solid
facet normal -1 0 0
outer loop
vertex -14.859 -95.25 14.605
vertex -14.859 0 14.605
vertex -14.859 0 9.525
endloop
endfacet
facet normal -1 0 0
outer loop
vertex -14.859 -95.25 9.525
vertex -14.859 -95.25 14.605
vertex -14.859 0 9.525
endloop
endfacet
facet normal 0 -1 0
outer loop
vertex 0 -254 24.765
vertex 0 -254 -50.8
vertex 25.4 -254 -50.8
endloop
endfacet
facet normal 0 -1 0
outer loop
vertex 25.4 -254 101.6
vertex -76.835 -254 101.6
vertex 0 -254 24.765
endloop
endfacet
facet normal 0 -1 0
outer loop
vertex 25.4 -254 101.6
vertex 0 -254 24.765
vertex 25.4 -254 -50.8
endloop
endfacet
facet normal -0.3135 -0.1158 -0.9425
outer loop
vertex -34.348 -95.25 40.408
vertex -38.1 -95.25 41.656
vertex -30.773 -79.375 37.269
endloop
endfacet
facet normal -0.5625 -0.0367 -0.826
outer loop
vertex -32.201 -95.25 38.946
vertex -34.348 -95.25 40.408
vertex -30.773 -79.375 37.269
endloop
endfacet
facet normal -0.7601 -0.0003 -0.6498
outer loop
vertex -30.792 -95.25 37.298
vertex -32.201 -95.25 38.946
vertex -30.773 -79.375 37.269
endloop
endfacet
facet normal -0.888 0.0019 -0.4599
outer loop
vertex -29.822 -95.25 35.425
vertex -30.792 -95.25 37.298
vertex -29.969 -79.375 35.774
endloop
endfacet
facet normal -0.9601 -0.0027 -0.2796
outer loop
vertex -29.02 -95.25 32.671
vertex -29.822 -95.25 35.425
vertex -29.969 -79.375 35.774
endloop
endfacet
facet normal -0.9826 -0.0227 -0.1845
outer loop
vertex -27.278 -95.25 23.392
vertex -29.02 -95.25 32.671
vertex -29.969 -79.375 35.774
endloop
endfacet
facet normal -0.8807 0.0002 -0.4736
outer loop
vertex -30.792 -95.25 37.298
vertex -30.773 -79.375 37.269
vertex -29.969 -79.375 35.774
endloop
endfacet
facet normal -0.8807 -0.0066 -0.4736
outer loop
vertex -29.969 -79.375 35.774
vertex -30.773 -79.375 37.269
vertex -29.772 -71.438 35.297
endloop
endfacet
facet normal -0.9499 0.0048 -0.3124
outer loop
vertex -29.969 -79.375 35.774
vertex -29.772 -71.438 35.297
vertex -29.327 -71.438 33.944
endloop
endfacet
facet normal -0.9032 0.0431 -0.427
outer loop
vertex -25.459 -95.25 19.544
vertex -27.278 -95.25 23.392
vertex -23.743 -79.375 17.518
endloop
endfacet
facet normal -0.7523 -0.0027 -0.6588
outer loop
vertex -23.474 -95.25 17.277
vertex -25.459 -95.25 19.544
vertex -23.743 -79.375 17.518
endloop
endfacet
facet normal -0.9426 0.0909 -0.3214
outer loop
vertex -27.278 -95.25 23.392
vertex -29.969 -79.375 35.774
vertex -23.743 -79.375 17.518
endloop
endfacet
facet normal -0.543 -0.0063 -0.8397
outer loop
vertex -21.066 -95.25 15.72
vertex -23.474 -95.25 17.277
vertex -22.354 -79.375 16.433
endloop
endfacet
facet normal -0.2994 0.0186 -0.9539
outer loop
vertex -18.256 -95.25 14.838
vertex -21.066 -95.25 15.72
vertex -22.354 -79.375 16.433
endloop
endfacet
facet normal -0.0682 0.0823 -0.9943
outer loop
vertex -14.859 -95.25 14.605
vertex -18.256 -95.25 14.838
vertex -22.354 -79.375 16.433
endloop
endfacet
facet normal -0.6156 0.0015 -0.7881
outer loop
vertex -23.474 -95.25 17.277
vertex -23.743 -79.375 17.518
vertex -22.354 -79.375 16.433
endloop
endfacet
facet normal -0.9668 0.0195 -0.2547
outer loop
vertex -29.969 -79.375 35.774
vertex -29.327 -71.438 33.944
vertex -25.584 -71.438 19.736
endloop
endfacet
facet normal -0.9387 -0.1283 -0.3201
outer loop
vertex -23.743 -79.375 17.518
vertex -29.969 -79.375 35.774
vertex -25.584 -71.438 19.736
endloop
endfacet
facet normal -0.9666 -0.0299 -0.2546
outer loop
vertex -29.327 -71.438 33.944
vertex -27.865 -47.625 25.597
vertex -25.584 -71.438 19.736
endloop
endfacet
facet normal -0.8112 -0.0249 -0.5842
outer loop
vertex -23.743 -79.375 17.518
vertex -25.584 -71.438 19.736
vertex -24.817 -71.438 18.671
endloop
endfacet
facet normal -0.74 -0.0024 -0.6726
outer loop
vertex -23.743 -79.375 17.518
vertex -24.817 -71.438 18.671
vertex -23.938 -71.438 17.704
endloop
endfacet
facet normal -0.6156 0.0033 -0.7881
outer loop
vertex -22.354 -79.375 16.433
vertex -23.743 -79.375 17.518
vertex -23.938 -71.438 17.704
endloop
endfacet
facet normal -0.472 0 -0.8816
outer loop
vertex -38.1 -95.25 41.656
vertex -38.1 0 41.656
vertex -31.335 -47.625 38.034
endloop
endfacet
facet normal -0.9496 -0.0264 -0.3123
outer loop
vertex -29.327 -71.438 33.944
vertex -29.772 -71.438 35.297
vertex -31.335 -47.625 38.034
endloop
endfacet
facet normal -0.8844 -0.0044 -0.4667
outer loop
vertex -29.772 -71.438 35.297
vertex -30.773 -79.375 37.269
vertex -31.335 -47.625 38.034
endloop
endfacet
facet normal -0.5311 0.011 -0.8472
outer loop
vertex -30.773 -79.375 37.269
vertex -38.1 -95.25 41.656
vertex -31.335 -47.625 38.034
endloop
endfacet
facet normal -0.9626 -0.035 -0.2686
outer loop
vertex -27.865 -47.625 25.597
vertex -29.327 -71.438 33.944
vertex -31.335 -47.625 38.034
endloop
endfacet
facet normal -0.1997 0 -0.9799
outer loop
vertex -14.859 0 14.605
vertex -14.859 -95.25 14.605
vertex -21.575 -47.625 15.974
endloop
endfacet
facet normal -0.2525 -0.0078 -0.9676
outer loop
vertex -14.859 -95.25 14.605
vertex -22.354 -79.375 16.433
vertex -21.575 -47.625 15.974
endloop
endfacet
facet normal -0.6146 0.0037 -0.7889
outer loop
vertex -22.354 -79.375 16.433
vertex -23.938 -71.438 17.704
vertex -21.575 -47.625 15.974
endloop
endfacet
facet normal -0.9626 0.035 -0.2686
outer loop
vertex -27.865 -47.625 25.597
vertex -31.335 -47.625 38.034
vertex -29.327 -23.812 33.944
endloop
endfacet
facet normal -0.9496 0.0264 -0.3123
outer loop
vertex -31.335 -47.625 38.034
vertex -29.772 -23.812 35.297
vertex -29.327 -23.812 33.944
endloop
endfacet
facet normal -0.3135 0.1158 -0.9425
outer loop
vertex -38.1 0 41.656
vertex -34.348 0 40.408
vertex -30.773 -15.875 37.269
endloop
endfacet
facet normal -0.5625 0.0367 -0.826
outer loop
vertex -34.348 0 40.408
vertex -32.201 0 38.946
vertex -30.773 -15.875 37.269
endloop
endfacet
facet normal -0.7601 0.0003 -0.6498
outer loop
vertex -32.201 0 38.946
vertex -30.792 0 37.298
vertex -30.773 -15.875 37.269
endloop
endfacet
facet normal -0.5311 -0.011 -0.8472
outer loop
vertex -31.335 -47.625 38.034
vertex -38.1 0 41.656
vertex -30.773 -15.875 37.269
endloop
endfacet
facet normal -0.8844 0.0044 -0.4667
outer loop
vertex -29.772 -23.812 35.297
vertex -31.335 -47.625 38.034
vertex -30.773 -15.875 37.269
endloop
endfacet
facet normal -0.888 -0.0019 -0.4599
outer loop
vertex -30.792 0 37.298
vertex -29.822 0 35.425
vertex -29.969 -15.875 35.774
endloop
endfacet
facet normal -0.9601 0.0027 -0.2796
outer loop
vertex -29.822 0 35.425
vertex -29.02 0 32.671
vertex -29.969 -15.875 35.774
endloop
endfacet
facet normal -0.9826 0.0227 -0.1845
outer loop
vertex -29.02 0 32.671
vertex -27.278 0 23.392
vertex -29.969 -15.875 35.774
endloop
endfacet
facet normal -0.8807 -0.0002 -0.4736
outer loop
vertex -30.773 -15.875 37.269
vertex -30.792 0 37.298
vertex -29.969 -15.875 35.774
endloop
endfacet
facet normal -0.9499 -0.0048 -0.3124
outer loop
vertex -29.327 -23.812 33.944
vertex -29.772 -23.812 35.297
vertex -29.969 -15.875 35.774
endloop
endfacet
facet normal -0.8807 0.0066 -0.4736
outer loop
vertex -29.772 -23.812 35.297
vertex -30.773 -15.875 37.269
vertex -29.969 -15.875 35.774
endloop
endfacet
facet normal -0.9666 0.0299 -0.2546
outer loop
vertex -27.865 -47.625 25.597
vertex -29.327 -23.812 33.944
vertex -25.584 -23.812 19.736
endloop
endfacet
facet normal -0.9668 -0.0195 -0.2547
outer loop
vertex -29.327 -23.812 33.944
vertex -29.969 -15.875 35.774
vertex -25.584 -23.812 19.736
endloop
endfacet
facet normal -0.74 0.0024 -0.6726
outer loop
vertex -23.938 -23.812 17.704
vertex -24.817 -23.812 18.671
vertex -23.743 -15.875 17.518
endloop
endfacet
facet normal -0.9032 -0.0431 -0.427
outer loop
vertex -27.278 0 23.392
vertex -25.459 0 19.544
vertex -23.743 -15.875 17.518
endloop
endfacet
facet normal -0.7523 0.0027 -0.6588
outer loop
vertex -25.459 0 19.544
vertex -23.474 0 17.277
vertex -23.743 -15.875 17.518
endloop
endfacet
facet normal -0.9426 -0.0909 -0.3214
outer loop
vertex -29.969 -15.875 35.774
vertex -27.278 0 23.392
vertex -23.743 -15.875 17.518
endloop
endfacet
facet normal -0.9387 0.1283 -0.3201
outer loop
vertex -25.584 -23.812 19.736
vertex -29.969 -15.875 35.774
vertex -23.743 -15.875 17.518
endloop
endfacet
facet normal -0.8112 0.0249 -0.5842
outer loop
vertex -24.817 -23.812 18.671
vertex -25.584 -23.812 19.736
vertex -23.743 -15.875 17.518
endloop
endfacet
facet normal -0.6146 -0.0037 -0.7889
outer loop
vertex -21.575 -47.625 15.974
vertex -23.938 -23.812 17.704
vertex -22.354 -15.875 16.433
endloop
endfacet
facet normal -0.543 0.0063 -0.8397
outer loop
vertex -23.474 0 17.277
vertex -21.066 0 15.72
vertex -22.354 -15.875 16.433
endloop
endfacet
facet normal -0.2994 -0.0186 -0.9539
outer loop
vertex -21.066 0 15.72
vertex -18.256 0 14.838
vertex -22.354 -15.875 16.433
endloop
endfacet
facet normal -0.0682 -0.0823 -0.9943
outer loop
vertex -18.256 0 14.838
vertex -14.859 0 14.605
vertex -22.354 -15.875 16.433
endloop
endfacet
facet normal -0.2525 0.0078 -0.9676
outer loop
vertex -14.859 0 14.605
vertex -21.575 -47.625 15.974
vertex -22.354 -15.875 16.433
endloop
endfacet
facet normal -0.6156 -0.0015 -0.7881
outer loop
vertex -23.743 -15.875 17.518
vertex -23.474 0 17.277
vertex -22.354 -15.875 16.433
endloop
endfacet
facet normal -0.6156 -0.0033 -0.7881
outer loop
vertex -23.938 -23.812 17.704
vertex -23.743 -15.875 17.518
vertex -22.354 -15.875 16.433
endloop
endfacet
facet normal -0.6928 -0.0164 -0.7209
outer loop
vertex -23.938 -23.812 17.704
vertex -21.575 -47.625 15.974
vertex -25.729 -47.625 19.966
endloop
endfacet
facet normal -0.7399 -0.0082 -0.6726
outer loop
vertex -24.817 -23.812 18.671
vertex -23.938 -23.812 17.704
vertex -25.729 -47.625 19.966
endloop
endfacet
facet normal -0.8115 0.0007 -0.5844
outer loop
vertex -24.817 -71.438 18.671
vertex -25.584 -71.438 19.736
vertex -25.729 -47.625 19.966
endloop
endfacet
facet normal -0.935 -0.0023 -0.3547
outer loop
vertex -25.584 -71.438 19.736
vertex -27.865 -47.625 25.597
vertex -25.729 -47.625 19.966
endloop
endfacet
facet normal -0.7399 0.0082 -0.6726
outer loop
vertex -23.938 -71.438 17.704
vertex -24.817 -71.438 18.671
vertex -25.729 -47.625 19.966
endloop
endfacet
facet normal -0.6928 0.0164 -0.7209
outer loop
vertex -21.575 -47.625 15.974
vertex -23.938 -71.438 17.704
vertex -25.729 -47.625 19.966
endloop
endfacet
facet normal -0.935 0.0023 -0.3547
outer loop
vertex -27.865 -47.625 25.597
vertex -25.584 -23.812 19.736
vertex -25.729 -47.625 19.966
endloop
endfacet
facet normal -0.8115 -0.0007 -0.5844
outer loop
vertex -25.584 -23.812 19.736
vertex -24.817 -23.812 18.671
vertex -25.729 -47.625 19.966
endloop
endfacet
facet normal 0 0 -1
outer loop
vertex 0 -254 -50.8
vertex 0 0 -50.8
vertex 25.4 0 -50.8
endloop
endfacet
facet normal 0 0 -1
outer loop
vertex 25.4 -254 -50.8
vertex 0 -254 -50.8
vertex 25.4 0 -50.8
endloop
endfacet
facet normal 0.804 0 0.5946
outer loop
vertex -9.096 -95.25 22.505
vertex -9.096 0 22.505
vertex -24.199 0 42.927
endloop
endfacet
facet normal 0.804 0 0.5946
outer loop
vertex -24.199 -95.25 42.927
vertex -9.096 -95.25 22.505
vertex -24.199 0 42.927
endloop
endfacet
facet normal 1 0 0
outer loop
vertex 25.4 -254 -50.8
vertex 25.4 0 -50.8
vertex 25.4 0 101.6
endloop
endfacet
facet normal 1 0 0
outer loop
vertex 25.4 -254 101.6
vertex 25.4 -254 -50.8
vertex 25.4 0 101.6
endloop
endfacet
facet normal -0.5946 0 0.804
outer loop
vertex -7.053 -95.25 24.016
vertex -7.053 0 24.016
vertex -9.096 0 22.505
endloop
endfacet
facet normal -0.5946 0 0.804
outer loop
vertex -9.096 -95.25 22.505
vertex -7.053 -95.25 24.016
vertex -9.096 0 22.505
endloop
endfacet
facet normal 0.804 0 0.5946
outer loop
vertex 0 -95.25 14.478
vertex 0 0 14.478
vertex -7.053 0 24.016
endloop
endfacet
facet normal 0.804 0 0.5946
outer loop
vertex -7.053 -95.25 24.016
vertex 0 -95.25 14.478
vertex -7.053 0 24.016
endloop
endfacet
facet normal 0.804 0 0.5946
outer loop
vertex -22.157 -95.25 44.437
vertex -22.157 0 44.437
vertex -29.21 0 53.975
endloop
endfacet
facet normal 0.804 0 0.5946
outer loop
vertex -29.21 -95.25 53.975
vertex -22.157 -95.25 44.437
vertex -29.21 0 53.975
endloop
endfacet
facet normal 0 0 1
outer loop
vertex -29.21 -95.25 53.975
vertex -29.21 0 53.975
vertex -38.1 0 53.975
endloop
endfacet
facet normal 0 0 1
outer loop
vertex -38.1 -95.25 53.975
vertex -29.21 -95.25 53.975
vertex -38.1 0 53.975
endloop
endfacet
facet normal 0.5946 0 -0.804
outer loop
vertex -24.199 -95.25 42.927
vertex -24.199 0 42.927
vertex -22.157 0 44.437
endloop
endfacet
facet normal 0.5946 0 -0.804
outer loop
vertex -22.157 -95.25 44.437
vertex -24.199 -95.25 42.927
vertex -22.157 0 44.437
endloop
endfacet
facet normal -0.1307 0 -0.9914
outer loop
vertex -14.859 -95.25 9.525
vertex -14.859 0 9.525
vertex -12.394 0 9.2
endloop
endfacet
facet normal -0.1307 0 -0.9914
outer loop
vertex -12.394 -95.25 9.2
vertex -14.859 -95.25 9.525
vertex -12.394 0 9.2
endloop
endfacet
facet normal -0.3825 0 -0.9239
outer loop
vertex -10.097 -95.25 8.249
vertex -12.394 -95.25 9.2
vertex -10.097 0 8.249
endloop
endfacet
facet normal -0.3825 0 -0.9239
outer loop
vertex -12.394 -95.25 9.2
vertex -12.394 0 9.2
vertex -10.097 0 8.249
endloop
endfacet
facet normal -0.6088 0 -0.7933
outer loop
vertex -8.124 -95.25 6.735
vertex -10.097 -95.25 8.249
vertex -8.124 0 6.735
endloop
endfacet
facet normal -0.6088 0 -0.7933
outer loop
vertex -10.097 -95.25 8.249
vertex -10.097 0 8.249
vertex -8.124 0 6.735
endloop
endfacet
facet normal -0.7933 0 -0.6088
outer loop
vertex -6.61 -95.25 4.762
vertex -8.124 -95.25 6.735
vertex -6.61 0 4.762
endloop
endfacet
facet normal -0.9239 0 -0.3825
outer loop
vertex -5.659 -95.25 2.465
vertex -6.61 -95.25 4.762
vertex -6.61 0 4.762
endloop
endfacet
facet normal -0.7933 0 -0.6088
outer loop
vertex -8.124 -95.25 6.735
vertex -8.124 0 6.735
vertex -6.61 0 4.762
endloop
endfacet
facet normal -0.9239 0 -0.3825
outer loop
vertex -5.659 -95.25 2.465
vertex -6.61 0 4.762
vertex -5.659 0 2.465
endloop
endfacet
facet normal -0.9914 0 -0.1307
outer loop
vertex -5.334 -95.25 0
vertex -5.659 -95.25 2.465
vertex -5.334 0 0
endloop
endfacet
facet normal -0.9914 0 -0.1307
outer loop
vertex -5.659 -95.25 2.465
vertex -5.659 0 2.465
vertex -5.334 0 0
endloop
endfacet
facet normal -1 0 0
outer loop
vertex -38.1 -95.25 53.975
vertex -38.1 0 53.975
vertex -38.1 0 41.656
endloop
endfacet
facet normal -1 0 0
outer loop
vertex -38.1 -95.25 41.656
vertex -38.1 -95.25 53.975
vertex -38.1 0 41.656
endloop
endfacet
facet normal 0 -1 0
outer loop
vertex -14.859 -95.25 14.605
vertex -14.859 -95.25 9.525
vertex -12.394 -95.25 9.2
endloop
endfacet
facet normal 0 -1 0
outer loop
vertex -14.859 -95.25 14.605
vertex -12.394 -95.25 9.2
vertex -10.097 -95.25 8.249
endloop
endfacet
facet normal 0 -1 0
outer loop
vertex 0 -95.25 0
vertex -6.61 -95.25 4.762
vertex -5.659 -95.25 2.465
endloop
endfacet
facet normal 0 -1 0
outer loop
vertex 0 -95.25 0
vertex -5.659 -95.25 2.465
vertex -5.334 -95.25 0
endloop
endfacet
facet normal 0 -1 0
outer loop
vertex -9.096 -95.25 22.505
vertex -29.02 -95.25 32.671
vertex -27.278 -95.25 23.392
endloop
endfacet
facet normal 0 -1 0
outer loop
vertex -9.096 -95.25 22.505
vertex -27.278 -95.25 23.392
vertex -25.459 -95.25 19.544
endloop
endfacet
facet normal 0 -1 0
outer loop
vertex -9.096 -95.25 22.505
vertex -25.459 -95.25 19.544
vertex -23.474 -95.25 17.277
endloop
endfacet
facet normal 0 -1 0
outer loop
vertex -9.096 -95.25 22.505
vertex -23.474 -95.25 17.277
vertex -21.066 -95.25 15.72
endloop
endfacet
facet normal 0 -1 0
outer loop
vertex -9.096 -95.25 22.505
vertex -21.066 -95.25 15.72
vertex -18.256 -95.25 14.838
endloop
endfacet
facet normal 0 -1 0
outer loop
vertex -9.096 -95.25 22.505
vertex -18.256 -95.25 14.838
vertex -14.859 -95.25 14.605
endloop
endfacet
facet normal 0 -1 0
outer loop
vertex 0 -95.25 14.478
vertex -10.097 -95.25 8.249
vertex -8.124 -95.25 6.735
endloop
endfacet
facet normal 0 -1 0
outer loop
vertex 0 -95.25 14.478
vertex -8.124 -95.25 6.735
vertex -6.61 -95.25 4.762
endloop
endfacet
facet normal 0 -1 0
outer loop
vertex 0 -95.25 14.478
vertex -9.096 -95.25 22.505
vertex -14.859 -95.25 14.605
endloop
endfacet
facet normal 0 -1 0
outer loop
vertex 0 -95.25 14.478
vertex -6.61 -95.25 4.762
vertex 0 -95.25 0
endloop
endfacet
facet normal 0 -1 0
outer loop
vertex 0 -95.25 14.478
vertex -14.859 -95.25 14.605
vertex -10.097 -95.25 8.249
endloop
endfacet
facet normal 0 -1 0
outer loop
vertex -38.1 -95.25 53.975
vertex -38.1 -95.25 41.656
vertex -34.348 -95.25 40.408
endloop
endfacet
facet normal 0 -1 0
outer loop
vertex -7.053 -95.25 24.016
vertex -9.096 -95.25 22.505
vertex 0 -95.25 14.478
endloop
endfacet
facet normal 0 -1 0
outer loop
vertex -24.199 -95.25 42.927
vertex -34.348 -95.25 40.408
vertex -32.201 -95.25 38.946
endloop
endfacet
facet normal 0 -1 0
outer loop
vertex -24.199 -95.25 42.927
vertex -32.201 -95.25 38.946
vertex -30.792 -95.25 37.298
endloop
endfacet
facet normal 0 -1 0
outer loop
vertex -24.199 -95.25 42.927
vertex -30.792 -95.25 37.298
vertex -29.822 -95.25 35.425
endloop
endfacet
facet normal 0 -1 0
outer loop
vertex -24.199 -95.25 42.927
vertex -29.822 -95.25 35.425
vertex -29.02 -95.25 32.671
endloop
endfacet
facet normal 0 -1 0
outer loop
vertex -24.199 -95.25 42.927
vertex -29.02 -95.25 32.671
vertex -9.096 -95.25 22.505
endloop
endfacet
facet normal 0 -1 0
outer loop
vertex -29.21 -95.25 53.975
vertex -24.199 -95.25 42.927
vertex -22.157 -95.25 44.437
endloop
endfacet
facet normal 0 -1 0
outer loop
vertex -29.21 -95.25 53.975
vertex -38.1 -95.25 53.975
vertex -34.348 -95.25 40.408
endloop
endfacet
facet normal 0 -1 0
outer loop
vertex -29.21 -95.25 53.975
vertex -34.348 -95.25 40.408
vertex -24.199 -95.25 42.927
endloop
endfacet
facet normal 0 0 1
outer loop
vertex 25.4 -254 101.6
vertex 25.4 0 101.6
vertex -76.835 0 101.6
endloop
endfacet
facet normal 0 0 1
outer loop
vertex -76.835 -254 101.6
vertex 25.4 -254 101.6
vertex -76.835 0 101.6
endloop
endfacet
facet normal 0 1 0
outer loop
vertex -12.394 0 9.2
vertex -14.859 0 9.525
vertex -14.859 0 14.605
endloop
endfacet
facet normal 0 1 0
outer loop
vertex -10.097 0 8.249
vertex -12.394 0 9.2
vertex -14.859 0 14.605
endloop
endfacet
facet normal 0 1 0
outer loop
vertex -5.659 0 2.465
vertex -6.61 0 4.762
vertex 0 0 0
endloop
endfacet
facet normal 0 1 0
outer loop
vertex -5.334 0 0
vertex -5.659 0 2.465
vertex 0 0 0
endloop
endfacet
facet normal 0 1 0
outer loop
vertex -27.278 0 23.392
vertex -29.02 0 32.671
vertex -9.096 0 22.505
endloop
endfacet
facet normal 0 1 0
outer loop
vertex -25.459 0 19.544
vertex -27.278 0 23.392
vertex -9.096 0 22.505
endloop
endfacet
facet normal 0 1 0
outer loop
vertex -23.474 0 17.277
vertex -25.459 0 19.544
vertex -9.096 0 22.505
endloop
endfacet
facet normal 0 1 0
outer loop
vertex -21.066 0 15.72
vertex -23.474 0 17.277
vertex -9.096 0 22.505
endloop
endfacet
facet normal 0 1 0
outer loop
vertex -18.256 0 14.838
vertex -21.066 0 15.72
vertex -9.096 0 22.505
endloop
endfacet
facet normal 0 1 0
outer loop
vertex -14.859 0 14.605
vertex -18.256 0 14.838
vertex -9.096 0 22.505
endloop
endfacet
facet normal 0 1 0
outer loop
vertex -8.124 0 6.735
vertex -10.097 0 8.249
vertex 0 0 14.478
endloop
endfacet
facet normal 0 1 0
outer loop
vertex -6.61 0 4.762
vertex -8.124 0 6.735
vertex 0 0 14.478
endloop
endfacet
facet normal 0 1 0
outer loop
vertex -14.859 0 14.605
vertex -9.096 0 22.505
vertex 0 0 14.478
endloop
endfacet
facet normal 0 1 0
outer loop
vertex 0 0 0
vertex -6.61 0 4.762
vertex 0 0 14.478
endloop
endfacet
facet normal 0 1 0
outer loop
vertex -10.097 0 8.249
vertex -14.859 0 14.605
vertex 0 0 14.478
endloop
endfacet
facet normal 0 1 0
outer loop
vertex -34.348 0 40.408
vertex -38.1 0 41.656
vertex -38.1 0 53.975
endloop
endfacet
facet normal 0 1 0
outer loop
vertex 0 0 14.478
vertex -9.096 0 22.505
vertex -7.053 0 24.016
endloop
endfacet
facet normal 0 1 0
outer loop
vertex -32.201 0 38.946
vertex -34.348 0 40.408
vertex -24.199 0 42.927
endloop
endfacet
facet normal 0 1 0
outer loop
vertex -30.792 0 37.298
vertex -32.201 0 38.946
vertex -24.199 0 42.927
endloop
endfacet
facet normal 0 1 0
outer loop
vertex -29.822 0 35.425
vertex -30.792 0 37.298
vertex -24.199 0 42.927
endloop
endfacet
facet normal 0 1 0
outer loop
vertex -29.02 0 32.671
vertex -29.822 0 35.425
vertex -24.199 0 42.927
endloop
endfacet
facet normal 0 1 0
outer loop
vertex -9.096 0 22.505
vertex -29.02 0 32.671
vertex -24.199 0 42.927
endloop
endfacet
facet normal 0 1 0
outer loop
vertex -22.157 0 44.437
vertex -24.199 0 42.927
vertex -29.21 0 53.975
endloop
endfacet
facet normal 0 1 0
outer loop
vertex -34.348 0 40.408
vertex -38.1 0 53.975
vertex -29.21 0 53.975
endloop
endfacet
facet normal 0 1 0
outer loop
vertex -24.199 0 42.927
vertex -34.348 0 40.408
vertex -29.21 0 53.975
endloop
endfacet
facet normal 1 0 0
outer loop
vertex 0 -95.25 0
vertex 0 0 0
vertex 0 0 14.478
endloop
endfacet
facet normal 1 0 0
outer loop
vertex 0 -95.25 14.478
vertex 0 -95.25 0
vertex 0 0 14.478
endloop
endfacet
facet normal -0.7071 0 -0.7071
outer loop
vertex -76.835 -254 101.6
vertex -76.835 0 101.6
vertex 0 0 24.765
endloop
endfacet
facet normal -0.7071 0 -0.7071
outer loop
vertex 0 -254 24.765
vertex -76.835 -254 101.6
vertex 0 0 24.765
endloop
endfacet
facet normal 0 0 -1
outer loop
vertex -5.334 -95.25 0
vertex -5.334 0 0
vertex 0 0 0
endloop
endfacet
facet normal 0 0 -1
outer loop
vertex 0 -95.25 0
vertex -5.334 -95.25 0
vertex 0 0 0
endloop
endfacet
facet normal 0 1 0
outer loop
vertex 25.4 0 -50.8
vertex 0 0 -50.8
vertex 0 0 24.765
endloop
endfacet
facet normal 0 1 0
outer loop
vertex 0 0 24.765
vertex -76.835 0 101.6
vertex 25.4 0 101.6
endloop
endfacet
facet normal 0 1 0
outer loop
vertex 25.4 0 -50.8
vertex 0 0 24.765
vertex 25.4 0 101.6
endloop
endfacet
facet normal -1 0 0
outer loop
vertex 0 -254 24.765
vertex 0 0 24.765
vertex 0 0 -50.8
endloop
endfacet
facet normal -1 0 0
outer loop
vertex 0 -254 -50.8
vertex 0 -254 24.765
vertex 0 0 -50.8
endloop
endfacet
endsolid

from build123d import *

# Parameters (mm, degrees)
F1_DEPTH = 95.25
F3_DEPTH = 254


with BuildPart() as f1:
    # F0 (on Front) → F1 (new body)
    with BuildSketch(Plane.XZ):
        with BuildLine():
            ThreePointArc((-14.859, 9.525), (-8.1238079092, 6.7351920908), (-5.334, 0))
            Line((-5.334, 0), (0, 0))
            Line((0, 0), (0, 14.478))
            Line((0, 14.478), (-7.0534642899, 24.0155104094))
            Line((-7.0534642899, 24.0155104094), (-9.095662208, 22.5052032674))
            Line((-9.095662208, 22.5052032674), (-24.1987336282, 42.9271824486))
            Line((-24.1987336282, 42.9271824486), (-22.1565357101, 44.4374895906))
            Line((-22.1565357101, 44.4374895906), (-29.21, 53.975))
            Line((-29.21, 53.975), (-38.1, 53.975))
            Line((-38.1, 53.975), (-38.1, 41.656))
            add(Edge.make_bspline(
                [(-38.1, 41.656), (-28.1570851803, 39.6384932101), (-30.2785540843, 24.9129260063), (-23.0376143008, 14.3336839974), (-14.859, 14.605)],
                knots=[0, 0, 0, 0, 0.513981523, 1, 1, 1, 1], degree=3))
            Line((-14.859, 14.605), (-14.859, 9.525))
        make_face()
    extrude(amount=F1_DEPTH)


with BuildPart() as f3:
    # F2 (on Front) → F3 (new body)
    with BuildSketch(Plane.XZ):
        Polygon((0, 24.765), (0, -50.8), (25.4, -50.8), (25.4, 101.6), (-76.835, 101.6), align=None)
    extrude(amount=F3_DEPTH)


with BuildPart() as f5_1:
    # F5: copy of F1
    add(f1.part)


with BuildPart() as f6_1:
    # F6: copy of F1
    add(f1.part)


solid = Compound([f1.part, f3.part])
